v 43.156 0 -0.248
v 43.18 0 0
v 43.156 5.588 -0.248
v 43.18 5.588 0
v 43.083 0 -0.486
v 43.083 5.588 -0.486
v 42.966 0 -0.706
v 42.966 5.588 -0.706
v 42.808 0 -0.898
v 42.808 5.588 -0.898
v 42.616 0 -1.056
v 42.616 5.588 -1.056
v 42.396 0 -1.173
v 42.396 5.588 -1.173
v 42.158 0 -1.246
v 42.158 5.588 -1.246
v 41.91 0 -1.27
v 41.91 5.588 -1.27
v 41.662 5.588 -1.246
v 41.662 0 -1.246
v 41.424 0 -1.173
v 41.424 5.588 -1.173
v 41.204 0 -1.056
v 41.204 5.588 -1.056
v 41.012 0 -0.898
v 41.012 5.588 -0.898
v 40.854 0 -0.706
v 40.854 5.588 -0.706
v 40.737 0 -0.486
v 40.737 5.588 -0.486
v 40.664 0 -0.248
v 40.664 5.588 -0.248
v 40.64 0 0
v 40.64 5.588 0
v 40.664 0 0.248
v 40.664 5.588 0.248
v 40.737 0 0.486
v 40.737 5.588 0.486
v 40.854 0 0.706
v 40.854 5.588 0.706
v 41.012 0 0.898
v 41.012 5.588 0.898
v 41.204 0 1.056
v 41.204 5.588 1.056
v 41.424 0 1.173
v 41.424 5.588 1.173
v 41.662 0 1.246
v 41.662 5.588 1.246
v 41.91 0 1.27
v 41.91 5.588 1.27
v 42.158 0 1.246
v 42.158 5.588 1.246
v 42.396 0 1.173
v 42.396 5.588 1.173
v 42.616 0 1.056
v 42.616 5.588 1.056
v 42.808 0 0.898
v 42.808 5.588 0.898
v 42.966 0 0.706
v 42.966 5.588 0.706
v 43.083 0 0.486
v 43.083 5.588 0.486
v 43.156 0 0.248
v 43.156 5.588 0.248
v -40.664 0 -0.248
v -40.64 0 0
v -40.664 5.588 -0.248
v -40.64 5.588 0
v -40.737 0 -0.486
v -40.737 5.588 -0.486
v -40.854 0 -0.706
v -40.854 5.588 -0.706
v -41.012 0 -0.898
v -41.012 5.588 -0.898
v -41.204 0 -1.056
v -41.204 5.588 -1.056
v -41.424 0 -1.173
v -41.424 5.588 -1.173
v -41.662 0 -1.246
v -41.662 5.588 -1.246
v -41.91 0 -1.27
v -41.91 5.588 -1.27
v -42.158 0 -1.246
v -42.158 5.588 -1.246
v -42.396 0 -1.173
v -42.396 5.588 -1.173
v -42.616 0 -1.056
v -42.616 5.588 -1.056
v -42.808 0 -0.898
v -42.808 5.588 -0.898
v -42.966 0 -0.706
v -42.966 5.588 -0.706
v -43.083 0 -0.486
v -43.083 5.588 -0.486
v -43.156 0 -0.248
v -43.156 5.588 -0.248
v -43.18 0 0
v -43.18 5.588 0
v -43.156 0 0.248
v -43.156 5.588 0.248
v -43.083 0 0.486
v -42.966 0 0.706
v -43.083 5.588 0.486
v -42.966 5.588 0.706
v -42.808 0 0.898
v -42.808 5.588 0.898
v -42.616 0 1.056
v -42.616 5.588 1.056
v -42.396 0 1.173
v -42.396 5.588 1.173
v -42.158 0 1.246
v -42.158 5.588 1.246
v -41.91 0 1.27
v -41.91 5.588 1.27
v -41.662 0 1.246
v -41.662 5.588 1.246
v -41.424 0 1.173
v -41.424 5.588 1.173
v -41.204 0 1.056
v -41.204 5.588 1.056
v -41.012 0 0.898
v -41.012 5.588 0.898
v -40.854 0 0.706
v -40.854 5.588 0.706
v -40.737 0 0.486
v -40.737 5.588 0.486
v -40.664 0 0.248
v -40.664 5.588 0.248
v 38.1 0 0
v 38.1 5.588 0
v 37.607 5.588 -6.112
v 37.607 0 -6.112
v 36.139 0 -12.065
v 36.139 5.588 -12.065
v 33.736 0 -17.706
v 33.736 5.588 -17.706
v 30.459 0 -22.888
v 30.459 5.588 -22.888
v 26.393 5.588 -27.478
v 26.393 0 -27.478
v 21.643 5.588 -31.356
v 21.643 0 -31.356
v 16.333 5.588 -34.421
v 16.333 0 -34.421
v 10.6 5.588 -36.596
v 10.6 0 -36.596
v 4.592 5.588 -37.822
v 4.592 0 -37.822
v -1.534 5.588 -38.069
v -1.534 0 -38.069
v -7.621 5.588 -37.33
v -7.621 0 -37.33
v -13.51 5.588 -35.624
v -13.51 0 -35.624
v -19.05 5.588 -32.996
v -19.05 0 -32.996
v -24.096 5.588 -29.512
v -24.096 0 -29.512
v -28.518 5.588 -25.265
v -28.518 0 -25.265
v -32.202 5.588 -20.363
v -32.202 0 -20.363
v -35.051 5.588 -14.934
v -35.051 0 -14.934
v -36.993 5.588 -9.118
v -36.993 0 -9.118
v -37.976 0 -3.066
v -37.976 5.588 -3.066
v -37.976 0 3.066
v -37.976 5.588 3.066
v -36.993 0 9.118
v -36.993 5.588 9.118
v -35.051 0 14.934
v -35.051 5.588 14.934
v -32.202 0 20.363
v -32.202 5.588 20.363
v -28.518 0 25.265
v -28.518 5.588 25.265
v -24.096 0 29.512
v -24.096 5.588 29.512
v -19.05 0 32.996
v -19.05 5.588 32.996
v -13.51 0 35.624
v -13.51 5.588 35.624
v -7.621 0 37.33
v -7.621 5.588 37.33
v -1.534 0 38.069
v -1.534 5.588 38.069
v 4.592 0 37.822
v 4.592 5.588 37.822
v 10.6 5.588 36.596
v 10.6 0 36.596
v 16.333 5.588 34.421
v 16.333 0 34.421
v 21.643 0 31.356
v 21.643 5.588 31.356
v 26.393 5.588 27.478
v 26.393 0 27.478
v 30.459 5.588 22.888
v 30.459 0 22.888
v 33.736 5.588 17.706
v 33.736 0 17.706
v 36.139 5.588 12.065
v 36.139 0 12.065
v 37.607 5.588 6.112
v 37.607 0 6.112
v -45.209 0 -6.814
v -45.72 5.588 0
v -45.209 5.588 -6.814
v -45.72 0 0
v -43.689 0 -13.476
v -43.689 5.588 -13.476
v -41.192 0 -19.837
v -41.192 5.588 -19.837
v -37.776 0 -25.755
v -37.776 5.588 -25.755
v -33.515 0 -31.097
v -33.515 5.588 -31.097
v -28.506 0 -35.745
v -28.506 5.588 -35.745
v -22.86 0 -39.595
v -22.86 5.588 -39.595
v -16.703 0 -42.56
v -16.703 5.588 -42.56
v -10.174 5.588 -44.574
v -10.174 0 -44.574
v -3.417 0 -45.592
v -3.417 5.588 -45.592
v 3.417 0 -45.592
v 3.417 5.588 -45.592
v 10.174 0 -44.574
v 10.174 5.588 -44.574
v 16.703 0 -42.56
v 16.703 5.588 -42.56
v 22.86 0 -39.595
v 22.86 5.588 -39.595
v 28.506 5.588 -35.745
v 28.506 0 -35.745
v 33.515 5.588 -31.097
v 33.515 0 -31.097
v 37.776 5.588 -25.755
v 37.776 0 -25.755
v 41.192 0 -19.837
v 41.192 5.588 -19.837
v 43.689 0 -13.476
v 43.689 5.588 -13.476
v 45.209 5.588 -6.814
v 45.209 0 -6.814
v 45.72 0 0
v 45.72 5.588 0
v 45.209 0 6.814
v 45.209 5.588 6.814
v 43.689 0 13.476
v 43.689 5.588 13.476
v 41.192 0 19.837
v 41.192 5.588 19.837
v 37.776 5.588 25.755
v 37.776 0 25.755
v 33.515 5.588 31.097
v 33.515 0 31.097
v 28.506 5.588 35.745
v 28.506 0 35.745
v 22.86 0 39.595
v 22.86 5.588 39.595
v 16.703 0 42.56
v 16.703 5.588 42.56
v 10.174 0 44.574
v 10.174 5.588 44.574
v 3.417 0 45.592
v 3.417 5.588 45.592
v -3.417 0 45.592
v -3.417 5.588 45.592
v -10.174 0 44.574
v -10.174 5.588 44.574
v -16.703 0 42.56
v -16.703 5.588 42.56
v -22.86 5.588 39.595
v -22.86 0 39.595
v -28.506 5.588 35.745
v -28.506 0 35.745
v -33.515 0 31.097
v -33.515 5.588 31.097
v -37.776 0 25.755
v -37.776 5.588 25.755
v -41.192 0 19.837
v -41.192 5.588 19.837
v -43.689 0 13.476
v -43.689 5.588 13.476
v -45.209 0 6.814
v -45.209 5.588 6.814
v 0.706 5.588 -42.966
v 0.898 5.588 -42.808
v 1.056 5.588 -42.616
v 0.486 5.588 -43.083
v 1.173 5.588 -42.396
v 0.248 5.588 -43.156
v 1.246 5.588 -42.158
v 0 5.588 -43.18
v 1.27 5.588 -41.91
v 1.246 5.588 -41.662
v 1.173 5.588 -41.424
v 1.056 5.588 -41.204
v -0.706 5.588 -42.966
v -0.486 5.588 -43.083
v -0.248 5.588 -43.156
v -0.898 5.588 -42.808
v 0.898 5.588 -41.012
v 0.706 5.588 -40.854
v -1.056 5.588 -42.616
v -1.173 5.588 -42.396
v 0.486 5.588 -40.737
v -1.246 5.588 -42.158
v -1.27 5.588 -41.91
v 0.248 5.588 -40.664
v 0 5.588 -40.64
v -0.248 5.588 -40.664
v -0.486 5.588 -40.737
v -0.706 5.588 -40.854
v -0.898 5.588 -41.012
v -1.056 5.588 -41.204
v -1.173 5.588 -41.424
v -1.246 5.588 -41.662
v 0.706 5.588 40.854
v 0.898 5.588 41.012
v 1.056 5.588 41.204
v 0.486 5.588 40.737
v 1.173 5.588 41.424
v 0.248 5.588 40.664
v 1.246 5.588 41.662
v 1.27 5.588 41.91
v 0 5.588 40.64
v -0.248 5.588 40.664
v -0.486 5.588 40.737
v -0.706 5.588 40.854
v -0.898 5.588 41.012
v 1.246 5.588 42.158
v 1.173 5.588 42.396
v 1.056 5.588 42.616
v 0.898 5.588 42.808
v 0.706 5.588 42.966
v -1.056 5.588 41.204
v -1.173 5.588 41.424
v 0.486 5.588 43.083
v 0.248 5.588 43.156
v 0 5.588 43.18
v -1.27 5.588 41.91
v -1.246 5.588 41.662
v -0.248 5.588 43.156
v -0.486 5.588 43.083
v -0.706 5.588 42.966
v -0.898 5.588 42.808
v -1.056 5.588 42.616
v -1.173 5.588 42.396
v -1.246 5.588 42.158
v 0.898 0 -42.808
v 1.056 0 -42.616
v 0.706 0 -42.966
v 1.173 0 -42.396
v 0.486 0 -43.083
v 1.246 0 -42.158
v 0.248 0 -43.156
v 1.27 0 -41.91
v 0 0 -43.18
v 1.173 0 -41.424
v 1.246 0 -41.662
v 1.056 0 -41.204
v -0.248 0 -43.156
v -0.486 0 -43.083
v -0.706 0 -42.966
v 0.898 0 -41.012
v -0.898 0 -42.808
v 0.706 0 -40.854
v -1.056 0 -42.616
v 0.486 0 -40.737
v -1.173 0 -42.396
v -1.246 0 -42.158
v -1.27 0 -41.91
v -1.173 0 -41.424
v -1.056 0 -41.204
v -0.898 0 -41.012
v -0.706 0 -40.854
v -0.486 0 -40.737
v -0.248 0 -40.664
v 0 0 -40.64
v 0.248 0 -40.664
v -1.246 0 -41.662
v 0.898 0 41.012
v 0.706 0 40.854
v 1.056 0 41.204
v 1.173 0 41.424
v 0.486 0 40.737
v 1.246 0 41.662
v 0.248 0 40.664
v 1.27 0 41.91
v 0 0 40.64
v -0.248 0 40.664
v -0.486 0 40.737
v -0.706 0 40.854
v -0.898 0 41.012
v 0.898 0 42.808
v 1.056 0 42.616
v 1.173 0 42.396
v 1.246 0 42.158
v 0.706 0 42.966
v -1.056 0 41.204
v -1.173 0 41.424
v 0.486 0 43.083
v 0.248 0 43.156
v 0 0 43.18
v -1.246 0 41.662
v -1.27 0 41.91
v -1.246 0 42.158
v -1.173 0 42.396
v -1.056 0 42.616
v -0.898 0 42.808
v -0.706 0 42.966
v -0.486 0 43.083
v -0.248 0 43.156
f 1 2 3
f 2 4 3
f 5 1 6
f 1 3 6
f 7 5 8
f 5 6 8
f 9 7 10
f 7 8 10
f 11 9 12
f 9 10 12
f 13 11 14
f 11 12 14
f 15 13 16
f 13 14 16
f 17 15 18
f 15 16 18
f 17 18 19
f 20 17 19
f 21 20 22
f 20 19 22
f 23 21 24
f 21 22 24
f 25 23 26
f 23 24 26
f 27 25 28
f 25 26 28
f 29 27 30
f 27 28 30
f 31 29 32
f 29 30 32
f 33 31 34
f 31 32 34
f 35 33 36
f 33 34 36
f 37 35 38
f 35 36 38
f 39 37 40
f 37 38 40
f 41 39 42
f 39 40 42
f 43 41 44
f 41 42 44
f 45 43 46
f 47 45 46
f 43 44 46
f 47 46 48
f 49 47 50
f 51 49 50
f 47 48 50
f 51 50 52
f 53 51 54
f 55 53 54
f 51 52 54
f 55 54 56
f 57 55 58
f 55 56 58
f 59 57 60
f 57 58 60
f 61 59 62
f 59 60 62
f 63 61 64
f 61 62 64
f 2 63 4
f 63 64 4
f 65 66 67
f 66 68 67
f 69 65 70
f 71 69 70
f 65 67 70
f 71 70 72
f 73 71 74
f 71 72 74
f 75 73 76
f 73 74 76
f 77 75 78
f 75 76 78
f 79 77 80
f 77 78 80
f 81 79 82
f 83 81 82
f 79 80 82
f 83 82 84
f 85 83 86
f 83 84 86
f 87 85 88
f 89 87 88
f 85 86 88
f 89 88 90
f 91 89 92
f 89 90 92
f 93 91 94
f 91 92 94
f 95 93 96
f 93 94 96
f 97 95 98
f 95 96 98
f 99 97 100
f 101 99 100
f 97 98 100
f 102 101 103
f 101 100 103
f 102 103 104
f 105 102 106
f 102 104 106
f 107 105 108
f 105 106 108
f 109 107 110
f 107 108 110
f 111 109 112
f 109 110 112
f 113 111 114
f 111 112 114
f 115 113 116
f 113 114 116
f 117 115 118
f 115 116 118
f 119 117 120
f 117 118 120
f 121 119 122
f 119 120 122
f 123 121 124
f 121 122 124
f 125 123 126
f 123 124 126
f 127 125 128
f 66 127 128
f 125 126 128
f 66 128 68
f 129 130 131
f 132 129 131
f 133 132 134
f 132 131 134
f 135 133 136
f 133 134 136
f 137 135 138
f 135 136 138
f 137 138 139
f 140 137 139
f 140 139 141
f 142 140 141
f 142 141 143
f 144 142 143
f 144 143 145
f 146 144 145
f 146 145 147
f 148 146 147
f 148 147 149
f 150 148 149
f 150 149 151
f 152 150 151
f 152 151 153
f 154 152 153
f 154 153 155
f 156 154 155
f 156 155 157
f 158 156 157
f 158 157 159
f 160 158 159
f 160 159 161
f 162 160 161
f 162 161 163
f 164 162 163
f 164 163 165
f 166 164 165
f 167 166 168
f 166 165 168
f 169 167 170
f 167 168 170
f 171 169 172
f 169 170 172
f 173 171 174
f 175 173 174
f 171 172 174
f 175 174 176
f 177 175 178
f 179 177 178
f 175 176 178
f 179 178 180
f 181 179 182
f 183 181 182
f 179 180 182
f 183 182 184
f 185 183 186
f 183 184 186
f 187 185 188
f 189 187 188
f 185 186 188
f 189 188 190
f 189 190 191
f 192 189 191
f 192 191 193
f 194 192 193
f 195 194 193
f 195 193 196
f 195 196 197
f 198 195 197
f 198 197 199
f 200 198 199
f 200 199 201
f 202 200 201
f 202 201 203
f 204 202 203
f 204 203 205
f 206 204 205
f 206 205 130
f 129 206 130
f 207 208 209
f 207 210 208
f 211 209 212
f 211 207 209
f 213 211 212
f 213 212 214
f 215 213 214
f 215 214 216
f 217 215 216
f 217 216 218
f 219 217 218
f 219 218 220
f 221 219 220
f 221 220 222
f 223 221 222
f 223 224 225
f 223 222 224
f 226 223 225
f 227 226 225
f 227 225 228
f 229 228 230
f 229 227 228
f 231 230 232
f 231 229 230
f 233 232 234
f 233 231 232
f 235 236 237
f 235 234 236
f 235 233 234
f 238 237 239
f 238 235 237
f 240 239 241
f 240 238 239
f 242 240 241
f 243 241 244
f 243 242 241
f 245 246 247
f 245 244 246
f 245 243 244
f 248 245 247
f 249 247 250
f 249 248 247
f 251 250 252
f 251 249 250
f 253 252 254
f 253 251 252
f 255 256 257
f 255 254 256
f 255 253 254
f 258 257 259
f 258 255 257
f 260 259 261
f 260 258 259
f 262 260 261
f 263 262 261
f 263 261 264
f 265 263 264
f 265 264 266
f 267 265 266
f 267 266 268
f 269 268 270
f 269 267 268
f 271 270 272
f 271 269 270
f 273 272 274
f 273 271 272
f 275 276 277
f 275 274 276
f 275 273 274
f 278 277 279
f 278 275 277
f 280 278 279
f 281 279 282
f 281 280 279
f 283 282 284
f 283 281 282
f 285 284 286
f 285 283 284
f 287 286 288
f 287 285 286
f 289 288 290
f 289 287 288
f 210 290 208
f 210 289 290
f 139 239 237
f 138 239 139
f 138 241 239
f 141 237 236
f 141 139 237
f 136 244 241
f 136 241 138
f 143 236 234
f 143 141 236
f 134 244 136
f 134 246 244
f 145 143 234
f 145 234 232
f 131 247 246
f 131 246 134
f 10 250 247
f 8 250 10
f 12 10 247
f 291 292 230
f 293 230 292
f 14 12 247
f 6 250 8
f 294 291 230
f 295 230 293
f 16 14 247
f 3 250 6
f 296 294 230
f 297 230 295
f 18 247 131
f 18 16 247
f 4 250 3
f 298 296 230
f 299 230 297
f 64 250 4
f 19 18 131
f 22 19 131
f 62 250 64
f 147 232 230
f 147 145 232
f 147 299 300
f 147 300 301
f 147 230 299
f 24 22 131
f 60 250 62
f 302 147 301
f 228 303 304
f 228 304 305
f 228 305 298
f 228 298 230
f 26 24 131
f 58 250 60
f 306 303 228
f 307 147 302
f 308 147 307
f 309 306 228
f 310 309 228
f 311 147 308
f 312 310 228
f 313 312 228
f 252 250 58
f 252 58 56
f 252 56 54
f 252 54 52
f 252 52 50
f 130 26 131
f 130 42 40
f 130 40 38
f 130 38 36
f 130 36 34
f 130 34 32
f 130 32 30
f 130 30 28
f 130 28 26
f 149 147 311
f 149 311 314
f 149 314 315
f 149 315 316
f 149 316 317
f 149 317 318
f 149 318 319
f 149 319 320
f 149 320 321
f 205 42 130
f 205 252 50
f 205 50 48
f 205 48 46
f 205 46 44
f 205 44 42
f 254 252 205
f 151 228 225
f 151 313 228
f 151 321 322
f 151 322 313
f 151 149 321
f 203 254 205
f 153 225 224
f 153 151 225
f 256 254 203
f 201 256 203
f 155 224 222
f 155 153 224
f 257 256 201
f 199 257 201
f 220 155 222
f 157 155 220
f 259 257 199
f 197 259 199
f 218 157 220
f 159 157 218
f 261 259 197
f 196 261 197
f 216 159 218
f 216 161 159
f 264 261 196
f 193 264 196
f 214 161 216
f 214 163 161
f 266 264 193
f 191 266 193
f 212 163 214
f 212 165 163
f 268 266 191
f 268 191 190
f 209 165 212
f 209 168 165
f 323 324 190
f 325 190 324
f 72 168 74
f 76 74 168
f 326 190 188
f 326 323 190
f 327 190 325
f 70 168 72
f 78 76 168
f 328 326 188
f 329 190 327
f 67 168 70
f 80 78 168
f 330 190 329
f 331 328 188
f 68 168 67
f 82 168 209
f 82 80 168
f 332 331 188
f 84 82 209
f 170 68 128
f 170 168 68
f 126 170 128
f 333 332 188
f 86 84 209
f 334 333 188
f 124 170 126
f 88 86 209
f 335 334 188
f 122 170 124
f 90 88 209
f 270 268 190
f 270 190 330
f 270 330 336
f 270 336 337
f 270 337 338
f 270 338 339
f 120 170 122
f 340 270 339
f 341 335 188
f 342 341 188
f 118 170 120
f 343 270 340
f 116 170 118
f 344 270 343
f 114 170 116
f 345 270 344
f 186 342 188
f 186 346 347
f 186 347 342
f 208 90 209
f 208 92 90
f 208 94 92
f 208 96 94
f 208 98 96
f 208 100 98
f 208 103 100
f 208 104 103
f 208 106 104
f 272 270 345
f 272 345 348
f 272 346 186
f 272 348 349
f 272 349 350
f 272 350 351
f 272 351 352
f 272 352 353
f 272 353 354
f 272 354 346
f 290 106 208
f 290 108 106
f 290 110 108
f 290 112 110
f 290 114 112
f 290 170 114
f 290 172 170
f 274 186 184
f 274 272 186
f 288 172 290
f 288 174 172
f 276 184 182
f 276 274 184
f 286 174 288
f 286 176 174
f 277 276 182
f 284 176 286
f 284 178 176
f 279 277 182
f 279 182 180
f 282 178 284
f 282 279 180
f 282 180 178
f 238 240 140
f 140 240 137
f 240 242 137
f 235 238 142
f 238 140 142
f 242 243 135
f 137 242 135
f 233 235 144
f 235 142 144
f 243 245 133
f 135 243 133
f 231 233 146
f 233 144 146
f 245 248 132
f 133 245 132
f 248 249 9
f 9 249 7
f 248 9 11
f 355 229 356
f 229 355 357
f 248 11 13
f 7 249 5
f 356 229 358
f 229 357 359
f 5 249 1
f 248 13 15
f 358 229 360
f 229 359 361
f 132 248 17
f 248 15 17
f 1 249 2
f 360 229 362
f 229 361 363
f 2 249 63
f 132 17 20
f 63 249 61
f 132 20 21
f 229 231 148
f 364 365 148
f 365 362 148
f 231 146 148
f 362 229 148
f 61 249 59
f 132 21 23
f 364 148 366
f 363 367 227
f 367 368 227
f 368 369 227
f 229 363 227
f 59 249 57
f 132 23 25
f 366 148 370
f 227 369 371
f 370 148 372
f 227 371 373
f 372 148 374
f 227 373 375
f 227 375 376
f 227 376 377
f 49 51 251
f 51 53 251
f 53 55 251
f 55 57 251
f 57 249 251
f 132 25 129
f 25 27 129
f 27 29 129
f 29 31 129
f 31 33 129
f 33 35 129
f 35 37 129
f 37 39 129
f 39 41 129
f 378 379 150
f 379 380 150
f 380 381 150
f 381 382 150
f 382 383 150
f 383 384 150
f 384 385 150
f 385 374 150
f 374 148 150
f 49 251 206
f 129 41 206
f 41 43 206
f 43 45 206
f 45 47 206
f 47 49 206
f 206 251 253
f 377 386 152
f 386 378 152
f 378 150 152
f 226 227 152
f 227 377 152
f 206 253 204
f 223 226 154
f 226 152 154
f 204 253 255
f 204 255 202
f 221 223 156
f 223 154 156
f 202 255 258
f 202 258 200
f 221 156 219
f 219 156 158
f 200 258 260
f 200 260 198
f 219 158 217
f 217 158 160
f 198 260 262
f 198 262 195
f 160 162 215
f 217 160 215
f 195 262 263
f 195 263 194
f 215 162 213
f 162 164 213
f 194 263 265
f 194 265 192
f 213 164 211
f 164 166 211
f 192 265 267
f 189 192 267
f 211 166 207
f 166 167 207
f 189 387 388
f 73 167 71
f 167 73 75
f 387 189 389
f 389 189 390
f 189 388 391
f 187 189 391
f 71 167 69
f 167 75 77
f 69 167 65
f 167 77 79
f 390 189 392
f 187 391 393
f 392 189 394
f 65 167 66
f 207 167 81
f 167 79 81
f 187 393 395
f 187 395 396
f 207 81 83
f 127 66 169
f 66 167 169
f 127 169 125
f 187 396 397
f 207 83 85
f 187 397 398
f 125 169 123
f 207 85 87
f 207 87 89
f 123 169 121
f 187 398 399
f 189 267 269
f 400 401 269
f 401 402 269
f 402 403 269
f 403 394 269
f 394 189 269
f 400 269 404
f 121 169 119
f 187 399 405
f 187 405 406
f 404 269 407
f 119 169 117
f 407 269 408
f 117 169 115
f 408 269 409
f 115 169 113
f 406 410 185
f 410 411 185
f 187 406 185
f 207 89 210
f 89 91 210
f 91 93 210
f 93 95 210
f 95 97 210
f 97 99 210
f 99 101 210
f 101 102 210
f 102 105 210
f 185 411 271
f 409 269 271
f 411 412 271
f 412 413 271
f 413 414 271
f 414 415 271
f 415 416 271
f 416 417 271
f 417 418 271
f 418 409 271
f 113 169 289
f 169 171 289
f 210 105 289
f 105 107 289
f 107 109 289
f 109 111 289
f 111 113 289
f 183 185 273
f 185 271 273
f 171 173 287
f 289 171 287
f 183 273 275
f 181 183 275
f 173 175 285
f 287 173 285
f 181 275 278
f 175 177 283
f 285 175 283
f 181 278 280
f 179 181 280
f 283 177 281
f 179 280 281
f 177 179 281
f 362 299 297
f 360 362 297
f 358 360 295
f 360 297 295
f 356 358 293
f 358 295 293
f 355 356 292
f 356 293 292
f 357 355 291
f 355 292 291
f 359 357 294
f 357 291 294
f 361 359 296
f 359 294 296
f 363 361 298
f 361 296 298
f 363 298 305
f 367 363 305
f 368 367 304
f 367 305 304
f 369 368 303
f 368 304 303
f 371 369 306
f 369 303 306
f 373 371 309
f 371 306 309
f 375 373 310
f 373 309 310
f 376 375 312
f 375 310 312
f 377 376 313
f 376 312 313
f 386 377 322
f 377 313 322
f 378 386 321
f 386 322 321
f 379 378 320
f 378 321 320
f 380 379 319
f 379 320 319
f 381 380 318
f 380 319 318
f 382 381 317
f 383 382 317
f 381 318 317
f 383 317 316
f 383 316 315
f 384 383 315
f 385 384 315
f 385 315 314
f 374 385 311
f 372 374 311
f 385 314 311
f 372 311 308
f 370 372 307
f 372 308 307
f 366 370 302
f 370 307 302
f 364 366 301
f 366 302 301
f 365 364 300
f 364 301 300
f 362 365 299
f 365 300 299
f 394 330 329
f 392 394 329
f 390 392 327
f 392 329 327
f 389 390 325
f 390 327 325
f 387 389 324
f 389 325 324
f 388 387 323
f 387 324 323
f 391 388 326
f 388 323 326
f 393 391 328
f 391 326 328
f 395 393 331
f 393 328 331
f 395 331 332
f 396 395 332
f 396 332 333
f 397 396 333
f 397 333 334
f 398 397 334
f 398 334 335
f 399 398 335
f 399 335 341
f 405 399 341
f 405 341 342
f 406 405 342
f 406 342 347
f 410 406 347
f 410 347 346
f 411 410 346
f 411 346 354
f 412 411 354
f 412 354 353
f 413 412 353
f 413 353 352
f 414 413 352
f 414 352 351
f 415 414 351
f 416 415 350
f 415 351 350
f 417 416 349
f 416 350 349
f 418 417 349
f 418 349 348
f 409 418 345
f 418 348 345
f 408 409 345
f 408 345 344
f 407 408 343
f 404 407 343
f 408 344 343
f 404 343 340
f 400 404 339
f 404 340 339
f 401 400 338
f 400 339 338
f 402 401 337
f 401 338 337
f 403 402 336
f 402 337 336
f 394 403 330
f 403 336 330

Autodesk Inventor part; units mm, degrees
ref_plane "YZ Plane" through (0, 0, 0) normal (1, 0, 0) x (0, 1, 0)
ref_plane "XZ Plane" through (0, 0, 0) normal (0, 1, 0) x (-1, 0, 0)
ref_plane "XY Plane" through (0, 0, 0) normal (0, 0, 1) x (1, 0, 0)
sketch "Sketch1" plane through (0, 0, 0) normal (0, 1, 0) x (-1, 0, 0)
  circle A0 centre (0, 0) radius 45.72
  dimension "d0" = 91.44
extrude "Extrusion1" add sketch "Sketch1" along normal blind 5.588
sketch "Sketch2" plane through (0, 5.588, 0) normal (0, 1, 0) x (1, 0, 0)
  circle A0 centre (0, 0) radius 38.1
  line L0 (0, 0) -> (-41.91, 0)
  line L1 (0, 0) -> (0, 41.91)
  line L2 (0, 0) -> (41.91, 0)
  line L3 (0, 0) -> (0, -41.91)
  circle A1 centre (-41.91, 0) radius 1.27
  circle A2 centre (0, 41.91) radius 1.27
  circle A3 centre (41.91, 0) radius 1.27
  circle A4 centre (0, -41.91) radius 1.27
  dimension "d3" = 76.2
  dimension "d4" = 41.91
  dimension "d5" = 41.91
  dimension "d6" = 41.91
  dimension "d7" = 41.91
  dimension "d8" = 2.54
  dimension "d9" = 2.54
  dimension "d10" = 2.54
  dimension "d11" = 2.54
extrude "Extrusion2" cut sketch "Sketch2" against normal blind 5.588
properties part number "open3" material "Plastic, Transparent"
